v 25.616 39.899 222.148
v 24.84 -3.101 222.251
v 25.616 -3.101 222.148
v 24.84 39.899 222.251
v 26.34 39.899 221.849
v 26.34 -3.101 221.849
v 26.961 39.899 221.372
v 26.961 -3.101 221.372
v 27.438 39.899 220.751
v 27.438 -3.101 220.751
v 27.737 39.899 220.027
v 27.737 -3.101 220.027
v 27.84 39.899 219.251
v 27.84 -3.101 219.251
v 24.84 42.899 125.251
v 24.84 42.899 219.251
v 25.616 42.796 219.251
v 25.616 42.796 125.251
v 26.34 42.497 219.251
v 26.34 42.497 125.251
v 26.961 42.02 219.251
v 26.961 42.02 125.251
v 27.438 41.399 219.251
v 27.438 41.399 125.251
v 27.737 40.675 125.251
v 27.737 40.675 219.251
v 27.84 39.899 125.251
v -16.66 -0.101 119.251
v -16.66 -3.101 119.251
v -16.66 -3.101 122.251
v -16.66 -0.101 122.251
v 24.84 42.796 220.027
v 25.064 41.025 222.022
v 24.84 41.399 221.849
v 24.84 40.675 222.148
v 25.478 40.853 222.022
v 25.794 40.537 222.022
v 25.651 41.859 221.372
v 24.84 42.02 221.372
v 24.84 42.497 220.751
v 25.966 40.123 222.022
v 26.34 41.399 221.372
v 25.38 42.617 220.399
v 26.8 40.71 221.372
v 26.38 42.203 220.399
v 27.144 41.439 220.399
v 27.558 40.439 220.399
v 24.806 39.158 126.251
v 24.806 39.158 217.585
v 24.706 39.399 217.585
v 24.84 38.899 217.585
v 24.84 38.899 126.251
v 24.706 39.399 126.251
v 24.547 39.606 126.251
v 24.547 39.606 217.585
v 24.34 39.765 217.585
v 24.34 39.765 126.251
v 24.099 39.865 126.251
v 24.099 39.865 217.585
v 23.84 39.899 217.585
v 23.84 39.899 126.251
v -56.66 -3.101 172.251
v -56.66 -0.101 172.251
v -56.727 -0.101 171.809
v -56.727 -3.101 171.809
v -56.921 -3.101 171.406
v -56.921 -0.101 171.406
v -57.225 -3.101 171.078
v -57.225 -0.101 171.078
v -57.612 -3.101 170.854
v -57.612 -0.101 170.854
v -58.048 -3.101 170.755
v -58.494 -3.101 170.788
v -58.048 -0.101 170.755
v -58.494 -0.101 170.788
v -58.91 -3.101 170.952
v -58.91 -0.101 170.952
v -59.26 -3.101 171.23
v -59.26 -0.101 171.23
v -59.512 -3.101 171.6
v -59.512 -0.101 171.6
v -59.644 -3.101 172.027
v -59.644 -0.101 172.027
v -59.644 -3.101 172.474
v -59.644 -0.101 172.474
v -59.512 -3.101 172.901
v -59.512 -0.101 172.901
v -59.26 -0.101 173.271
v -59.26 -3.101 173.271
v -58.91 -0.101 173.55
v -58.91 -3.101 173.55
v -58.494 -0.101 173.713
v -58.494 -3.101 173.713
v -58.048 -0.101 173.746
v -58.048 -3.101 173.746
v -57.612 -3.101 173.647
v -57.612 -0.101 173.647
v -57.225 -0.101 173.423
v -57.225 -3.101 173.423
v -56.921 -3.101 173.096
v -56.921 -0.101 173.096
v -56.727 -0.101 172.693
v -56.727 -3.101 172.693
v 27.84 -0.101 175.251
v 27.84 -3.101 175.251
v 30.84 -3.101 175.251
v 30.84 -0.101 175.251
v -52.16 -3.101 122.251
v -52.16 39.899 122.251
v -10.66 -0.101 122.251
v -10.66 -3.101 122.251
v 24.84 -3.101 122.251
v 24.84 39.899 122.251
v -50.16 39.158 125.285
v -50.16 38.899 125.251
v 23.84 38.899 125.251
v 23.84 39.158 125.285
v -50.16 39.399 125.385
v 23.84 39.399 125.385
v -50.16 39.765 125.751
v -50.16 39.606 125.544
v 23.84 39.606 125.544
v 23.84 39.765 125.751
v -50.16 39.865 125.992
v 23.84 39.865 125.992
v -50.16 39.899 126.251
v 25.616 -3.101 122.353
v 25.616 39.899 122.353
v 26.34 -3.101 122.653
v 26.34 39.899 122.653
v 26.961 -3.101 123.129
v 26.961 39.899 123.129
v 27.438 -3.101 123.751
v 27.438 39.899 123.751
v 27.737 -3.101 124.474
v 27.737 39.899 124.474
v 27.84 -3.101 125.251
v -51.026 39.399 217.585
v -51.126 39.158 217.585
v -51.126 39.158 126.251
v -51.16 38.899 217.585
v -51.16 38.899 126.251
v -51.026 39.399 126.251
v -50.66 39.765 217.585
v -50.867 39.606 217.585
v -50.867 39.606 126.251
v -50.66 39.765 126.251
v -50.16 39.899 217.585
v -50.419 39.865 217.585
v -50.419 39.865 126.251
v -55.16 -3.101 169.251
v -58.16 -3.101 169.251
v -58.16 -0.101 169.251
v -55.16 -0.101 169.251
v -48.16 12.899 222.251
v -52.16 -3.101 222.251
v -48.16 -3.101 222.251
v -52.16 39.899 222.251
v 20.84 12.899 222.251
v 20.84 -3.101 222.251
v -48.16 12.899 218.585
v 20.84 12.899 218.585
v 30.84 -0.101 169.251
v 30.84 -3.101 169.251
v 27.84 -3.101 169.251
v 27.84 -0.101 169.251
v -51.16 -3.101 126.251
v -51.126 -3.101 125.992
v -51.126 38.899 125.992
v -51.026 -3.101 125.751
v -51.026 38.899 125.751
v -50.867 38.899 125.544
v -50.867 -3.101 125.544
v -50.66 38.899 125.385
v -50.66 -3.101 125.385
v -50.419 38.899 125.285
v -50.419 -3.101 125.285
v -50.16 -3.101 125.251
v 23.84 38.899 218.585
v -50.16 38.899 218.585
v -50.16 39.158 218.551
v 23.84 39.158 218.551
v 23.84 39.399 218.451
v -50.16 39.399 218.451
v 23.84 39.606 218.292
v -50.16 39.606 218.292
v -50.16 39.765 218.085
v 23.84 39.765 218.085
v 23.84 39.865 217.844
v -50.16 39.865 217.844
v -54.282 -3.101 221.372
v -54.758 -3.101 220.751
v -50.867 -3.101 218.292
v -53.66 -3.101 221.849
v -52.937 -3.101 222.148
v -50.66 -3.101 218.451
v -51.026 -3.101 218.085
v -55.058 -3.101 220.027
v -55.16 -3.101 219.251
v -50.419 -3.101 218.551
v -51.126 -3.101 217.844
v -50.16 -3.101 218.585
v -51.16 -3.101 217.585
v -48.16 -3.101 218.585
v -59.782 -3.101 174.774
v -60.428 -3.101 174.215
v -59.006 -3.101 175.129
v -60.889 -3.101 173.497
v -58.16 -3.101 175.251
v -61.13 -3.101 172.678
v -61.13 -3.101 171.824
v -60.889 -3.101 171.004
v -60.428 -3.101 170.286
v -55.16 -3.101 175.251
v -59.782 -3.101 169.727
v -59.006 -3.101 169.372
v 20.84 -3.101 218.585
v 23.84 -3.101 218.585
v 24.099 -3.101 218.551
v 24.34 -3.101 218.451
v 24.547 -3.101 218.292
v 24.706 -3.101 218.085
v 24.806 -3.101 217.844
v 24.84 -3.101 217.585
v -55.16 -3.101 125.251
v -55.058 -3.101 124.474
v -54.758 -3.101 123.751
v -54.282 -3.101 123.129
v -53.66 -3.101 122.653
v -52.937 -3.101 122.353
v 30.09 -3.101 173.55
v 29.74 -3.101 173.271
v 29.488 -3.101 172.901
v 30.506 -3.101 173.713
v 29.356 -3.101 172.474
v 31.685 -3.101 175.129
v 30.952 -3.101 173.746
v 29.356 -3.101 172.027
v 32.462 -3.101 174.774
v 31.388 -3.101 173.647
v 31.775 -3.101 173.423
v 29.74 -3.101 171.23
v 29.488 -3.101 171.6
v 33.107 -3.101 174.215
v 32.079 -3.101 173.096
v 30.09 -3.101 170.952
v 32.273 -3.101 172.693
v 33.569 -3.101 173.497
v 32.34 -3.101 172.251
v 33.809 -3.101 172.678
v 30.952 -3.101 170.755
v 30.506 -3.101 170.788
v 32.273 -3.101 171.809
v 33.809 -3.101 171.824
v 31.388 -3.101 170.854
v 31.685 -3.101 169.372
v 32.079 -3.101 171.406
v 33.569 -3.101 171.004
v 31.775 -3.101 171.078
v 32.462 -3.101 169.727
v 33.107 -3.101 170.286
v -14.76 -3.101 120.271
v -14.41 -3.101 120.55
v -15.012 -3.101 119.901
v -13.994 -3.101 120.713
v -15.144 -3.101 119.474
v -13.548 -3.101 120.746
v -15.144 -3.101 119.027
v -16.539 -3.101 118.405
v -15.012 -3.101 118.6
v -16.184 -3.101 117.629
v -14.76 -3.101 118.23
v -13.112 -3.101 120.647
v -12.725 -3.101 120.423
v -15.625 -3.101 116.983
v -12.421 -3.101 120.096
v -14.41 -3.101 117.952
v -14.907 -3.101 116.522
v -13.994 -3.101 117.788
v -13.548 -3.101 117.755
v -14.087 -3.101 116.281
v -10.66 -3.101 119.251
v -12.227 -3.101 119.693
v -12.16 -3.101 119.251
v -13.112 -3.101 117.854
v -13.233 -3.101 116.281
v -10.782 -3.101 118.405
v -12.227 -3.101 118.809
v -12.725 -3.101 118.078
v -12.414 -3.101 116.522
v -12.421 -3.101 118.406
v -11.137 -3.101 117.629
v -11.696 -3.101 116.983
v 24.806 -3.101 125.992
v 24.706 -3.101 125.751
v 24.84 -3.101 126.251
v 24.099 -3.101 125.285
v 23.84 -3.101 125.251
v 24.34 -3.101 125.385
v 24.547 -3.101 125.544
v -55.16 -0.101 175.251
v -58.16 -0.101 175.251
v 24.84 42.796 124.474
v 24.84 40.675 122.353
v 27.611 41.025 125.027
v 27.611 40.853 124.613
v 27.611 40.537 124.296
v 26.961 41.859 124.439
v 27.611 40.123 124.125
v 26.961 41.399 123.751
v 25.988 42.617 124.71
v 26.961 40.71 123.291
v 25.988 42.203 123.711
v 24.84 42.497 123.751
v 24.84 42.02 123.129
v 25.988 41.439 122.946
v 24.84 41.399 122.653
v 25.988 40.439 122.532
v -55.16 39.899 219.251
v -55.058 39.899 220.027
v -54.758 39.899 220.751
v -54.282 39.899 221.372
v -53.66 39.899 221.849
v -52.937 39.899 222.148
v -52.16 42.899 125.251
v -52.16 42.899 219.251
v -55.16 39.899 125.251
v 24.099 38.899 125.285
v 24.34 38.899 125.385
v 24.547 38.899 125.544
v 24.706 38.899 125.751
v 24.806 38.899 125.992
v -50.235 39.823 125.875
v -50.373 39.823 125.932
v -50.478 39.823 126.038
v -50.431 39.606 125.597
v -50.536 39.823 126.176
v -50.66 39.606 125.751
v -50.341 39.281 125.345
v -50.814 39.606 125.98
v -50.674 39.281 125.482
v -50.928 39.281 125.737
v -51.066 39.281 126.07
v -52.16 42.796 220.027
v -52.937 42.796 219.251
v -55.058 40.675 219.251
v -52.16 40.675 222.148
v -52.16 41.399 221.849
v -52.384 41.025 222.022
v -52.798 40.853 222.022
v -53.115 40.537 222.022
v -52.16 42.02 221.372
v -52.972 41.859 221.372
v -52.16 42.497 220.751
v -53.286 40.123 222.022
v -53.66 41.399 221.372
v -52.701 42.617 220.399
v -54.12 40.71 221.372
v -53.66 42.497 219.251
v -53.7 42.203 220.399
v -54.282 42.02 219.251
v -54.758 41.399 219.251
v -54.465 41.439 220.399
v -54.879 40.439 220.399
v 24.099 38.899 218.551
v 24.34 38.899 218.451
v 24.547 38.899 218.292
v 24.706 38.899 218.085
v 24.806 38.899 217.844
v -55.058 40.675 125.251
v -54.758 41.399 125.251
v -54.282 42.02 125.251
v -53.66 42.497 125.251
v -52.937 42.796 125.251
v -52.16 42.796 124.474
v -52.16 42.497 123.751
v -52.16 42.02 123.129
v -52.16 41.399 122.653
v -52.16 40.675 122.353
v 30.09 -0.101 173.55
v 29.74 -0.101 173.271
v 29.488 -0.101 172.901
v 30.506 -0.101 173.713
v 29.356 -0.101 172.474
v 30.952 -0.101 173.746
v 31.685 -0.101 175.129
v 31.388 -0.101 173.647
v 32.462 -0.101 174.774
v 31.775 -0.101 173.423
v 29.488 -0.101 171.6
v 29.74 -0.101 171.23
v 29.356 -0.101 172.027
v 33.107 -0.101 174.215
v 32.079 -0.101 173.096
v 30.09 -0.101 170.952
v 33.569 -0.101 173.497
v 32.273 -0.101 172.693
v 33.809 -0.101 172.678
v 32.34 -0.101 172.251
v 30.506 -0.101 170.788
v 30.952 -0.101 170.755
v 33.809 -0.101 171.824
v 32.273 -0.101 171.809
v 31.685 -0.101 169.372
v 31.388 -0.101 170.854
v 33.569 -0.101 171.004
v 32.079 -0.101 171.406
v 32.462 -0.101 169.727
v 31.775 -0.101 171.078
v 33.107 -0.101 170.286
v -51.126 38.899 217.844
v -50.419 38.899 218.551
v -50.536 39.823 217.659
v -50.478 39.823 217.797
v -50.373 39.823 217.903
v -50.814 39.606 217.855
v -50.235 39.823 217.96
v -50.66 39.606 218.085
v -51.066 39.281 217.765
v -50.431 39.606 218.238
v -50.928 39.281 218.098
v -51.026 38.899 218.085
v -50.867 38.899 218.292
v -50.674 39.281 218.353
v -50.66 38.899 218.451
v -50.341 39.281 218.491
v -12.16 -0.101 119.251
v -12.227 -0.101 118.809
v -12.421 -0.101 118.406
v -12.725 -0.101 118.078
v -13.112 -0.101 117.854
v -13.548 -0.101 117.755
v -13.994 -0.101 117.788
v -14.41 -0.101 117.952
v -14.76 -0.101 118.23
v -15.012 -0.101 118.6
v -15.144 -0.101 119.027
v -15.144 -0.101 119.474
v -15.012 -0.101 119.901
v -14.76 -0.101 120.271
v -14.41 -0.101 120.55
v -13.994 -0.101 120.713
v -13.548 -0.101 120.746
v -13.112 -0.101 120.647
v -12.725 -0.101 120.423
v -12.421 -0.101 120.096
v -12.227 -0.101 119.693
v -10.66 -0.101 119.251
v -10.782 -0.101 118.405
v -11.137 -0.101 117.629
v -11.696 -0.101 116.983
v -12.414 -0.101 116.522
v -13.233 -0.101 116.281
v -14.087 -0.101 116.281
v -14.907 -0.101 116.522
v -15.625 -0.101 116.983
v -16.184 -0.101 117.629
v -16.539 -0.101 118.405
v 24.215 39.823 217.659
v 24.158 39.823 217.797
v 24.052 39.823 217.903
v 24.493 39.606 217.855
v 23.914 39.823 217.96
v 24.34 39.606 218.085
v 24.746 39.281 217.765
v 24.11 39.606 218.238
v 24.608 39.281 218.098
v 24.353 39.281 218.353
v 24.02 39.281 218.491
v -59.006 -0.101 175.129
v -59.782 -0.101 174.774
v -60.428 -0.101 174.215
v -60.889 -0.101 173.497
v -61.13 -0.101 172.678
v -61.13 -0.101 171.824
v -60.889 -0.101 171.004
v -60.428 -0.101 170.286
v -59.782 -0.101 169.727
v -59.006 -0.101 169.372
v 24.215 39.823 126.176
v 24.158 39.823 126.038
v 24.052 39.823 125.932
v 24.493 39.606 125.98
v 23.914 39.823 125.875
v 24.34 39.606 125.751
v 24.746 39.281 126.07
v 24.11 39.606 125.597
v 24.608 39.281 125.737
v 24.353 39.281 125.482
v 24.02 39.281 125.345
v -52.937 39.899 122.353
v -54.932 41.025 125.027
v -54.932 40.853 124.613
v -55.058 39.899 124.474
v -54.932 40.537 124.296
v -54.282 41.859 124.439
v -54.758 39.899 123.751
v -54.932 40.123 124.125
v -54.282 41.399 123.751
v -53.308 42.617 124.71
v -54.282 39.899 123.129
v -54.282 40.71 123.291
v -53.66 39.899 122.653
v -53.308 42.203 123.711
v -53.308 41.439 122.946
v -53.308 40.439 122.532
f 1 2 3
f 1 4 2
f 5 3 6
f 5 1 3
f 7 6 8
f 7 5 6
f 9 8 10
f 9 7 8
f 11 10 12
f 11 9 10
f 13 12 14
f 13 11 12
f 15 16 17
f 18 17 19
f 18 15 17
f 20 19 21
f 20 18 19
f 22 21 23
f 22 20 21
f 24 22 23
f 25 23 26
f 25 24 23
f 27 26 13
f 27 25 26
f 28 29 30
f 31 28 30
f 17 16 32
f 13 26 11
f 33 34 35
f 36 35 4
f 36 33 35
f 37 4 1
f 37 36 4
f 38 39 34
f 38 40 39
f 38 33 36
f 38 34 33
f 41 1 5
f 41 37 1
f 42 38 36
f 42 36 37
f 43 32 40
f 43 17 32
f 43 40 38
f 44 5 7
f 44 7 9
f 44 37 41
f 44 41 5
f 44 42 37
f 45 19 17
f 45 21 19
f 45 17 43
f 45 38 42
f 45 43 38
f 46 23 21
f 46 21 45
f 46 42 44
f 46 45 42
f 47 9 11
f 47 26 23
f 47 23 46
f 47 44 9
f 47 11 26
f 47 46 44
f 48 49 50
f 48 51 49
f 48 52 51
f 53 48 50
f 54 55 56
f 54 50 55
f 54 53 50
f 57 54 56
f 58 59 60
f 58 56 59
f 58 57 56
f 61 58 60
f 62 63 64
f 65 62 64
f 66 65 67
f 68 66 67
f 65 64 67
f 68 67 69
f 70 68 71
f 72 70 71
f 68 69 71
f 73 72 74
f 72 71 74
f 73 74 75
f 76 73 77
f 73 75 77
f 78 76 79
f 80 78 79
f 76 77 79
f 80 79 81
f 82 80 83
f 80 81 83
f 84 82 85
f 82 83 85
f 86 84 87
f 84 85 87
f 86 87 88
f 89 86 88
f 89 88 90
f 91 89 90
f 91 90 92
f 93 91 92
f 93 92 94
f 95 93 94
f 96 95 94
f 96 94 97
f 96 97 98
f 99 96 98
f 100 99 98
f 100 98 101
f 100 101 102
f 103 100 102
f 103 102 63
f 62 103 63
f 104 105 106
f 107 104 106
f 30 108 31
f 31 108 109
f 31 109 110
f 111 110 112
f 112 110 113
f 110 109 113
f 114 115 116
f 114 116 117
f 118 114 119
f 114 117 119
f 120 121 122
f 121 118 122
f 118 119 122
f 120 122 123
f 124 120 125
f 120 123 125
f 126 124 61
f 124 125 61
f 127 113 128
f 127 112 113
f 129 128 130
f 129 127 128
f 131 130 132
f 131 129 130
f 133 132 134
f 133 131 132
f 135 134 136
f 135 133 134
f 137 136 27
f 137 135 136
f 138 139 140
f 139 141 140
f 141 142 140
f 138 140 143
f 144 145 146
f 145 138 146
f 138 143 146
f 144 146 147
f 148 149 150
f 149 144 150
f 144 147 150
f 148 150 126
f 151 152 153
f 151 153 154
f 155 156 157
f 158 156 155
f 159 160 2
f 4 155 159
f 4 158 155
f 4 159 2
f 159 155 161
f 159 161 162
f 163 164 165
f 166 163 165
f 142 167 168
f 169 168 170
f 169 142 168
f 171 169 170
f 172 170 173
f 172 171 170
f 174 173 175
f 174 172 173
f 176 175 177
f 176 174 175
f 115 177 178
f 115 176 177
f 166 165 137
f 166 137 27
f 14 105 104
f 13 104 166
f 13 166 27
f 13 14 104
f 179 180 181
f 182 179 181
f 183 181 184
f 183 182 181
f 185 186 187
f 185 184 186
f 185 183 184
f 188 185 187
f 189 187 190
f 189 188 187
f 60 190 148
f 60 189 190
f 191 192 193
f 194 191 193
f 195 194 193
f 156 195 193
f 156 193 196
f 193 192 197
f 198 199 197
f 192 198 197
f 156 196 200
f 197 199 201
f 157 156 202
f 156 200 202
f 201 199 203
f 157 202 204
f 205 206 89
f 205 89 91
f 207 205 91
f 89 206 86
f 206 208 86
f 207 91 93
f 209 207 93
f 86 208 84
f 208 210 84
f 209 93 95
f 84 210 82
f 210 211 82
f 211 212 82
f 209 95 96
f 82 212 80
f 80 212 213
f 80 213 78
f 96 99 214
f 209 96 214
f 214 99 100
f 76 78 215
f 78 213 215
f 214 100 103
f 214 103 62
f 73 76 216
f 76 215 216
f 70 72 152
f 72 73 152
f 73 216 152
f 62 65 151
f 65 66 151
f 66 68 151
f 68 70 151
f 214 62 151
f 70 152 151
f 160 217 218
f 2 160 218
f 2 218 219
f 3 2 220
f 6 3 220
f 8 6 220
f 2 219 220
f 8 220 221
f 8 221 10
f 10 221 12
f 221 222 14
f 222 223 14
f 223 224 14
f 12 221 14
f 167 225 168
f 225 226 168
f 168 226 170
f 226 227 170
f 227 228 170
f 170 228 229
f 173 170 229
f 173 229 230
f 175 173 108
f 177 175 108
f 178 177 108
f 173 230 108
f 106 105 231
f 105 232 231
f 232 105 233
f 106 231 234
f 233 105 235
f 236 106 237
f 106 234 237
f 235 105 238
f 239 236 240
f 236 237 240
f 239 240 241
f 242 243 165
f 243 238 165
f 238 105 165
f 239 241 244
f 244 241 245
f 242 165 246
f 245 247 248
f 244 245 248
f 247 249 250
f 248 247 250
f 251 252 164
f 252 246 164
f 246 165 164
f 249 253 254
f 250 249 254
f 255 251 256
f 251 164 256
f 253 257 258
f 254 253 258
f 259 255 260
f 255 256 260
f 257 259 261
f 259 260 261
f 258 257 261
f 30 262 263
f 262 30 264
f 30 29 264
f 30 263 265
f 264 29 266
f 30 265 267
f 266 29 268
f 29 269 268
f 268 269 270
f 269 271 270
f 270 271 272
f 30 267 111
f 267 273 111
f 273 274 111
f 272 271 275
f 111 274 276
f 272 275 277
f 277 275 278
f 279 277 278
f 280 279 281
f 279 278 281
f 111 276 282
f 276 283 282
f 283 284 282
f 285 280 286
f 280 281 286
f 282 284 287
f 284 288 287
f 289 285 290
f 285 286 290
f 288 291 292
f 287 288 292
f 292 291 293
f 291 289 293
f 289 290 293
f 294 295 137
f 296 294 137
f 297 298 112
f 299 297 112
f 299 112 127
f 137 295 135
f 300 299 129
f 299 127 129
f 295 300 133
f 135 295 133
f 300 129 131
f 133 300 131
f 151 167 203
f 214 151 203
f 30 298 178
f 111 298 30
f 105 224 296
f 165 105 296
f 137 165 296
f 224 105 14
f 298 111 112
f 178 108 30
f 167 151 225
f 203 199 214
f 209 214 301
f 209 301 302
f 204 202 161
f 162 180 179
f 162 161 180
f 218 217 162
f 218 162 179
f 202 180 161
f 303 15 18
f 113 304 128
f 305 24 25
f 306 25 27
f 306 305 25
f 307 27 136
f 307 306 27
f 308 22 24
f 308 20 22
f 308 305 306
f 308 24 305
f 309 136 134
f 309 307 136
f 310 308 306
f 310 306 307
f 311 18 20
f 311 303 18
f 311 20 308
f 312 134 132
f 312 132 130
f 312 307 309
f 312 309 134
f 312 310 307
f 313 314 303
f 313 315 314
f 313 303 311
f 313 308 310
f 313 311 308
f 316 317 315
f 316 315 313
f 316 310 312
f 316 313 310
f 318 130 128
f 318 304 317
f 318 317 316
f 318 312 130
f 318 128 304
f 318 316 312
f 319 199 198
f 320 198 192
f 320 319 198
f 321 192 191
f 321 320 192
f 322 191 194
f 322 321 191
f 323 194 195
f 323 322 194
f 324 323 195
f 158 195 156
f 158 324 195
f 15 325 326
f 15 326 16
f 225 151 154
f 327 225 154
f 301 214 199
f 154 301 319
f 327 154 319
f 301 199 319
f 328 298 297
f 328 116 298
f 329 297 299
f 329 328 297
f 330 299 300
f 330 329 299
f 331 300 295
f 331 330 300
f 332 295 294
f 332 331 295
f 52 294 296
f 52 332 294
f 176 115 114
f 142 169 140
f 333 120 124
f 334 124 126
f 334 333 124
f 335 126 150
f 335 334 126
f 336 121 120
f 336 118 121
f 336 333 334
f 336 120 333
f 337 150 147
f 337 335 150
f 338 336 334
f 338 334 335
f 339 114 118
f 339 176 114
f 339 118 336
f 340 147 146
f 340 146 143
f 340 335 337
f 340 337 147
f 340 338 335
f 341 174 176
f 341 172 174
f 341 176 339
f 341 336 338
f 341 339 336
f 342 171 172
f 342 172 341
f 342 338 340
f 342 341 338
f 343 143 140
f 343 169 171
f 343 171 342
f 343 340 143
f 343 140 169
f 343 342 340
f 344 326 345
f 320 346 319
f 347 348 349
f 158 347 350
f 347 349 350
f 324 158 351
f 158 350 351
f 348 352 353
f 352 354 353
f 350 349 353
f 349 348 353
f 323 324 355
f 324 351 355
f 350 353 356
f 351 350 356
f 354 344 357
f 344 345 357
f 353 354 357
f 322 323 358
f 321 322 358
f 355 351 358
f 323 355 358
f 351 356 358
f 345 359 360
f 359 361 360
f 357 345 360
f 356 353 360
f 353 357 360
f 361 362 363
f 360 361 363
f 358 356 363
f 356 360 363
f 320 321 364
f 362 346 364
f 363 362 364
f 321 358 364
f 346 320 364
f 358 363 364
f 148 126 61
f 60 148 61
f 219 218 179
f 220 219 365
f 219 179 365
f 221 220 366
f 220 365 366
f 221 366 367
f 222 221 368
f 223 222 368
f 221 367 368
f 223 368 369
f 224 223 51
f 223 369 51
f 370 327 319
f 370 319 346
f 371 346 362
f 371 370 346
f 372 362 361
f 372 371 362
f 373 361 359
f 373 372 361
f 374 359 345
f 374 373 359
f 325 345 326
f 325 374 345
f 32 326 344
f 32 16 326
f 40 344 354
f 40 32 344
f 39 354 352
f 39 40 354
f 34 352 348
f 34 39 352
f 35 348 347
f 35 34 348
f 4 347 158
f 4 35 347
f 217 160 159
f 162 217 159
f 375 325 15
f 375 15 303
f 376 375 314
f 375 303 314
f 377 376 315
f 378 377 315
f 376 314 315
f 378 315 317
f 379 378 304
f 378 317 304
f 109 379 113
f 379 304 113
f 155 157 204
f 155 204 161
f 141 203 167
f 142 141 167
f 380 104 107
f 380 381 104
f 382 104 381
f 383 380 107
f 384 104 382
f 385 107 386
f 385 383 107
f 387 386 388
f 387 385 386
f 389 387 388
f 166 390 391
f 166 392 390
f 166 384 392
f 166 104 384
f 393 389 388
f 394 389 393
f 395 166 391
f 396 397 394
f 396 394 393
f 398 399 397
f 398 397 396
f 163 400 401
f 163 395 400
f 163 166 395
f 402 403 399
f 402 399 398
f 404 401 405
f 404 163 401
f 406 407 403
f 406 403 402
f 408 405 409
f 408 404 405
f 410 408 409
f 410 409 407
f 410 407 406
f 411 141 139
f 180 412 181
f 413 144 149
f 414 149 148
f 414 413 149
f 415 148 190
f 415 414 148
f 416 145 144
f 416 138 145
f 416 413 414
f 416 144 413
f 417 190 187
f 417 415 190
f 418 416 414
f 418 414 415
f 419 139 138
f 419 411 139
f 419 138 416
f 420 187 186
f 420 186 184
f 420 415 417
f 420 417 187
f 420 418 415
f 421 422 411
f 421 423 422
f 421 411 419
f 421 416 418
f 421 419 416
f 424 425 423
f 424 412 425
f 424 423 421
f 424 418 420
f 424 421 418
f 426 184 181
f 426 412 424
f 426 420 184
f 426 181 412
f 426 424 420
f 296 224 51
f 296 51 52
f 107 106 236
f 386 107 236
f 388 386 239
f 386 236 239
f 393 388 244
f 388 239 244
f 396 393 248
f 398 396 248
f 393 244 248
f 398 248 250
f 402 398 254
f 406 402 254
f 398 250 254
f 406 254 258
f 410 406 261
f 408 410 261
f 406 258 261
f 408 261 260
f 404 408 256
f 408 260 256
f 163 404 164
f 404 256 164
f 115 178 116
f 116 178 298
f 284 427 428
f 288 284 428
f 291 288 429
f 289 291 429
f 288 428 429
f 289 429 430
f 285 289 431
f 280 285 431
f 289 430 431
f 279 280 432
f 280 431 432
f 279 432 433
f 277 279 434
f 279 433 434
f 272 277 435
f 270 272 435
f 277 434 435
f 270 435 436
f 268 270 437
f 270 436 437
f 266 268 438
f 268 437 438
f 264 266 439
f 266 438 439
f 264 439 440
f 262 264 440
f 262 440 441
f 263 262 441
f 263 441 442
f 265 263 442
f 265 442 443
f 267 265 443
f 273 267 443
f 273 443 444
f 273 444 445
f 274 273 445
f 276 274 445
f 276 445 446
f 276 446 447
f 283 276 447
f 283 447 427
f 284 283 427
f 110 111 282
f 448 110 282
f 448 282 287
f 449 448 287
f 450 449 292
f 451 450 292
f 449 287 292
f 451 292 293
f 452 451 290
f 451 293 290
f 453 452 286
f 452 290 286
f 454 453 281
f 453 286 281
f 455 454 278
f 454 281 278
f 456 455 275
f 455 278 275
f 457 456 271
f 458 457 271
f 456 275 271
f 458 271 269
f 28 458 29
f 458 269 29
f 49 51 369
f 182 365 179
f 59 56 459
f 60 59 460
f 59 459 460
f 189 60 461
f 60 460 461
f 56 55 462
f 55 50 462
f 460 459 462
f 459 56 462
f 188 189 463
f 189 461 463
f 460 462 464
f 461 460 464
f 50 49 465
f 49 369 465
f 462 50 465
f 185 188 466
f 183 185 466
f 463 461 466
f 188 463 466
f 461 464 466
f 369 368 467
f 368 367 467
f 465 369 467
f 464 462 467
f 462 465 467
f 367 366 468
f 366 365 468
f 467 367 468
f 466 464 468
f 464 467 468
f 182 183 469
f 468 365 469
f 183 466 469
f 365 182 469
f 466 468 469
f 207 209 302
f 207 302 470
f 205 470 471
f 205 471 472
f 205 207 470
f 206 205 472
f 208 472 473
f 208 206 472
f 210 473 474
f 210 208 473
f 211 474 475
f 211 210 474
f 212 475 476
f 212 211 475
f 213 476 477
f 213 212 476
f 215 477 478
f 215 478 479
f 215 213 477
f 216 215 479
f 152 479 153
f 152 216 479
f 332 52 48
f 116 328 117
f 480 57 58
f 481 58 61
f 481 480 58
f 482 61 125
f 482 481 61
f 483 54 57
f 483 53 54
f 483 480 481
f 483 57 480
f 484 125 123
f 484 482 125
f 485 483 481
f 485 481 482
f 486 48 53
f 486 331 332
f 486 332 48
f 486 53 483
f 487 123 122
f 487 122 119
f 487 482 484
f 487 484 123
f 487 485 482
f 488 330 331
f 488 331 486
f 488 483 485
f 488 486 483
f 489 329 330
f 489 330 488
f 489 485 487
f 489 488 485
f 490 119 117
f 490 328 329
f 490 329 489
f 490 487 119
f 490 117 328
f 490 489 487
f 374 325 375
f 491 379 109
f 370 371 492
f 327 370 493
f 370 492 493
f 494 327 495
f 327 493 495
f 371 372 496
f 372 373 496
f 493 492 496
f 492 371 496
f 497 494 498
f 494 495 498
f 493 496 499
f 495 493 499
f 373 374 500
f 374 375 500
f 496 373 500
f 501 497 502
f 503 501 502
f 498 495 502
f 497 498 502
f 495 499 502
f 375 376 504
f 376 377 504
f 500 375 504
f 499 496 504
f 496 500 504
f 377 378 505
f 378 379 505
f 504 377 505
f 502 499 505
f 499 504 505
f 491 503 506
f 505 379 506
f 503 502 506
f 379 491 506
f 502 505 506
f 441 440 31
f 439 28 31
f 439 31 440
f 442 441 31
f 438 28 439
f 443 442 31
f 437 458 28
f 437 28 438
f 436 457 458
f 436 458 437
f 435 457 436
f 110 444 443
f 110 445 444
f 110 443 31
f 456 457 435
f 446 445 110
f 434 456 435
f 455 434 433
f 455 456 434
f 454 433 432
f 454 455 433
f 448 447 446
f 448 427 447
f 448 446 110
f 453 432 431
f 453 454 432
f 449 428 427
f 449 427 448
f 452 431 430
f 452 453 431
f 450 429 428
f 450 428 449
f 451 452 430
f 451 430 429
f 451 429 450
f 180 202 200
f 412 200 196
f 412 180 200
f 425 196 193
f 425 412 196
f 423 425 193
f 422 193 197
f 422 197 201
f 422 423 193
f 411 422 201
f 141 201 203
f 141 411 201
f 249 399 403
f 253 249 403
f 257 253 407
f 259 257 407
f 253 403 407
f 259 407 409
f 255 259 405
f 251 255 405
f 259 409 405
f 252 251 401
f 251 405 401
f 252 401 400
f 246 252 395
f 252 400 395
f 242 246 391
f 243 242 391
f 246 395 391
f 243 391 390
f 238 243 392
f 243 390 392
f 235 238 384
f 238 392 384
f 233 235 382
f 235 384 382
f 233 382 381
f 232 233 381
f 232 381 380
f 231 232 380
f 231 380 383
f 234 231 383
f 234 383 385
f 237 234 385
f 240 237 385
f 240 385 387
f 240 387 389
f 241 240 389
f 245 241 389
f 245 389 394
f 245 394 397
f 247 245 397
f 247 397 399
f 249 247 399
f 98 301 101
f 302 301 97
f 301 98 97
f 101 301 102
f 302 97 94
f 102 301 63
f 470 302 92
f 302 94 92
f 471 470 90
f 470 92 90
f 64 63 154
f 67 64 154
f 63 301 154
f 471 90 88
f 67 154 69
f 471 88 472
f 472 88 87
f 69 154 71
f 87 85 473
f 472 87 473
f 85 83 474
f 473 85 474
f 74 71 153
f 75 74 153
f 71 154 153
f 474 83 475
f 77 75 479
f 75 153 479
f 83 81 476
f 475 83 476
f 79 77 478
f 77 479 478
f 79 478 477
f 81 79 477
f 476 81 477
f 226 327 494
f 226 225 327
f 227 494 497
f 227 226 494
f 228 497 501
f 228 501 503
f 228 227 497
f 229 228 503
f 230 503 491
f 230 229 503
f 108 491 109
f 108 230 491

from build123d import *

# Parameters (mm, degrees)
CROQUIS2_W              = 83
CROQUIS2_H              = 100
CROQUIS2_W_2            = 76
CROQUIS2_H_2            = 93.334161502
SALIENTE_EXTRUIR1_DEPTH = 43
CROQUIS3_W              = 83
CROQUIS3_H              = 3
SALIENTE_EXTRUIR2_DEPTH = 100
CROQUIS4_W              = 69
CROQUIS4_H              = 16
CORTAR_EXTRUIR3_DEPTH   = 10
SALIENTE_EXTRUIR3_DEPTH = 3
CROQUIS6_R              = 1.5
CORTAR_EXTRUIR4_DEPTH   = 13
REDONDEO1_R             = 3
REDONDEO2_R             = 1


with BuildPart() as part:
    # Croquis2 → Saliente-Extruir1 (new body)
    with BuildSketch(Plane(origin=(0, -3.101295798, 0), x_dir=(1, 0, 0), z_dir=(0, 1, 0))):
        with Locations((-13.660303869, -172.250641144)):
            Rectangle(CROQUIS2_W, CROQUIS2_H)
        with Locations((-13.160303869, -171.917721895)):
            Rectangle(CROQUIS2_W_2, CROQUIS2_H_2, mode=Mode.SUBTRACT)
    extrude(amount=SALIENTE_EXTRUIR1_DEPTH)

    # Croquis3 → Saliente-Extruir2 (add)
    with BuildSketch(Plane.XY.offset(222.250641144)):
        with Locations((-13.660303869, 41.398704202)):
            Rectangle(CROQUIS3_W, CROQUIS3_H)
    extrude(amount=-SALIENTE_EXTRUIR2_DEPTH)

    # Croquis4 → Cortar-Extruir3 (cut)
    with BuildSketch(Plane.XY.offset(222.250641144)):
        with Locations((-13.660303869, 4.898704202)):
            Rectangle(CROQUIS4_W, CROQUIS4_H)
    extrude(amount=-CORTAR_EXTRUIR3_DEPTH, mode=Mode.SUBTRACT)

    # Croquis5 → Saliente-Extruir3 (add)
    with BuildSketch(Plane(origin=(0, -3.101295798, 0), x_dir=(1, 0, 0), z_dir=(0, 1, 0))):
        with BuildLine():
            Line((-58.160303869, -169.250641144), (-55.160303869, -169.250641144))
            Line((-55.160303869, -169.250641144), (-55.160303869, -175.250641144))
            Line((-55.160303869, -175.250641144), (-58.160303869, -175.250641144))
            ThreePointArc((-58.160303869, -175.250641144), (-61.160303869, -172.250641144), (-58.160303869, -169.250641144))
        make_face()
        with BuildLine():
            Line((-16.660303869, -119.250641144), (-16.660303869, -122.250641144))
            Line((-16.660303869, -122.250641144), (-10.660303869, -122.250641144))
            Line((-10.660303869, -122.250641144), (-10.660303869, -119.250641144))
            ThreePointArc((-10.660303869, -119.250641144), (-13.660303869, -116.250641144), (-16.660303869, -119.250641144))
        make_face()
        with BuildLine():
            Line((30.839696131, -169.250641144), (27.839696131, -169.250641144))
            Line((27.839696131, -169.250641144), (27.839696131, -175.250641144))
            Line((27.839696131, -175.250641144), (30.839696131, -175.250641144))
            ThreePointArc((30.839696131, -175.250641144), (33.839696131, -172.250641144), (30.839696131, -169.250641144))
        make_face()
    extrude(amount=SALIENTE_EXTRUIR3_DEPTH)

    # Croquis6 → Cortar-Extruir4 (cut)
    with BuildSketch(Plane(origin=(0, -0.101295798, 0), x_dir=(1, 0, 0), z_dir=(0, 1, 0))):
        with Locations((30.839696131, -172.250641144)):
            Circle(CROQUIS6_R)
        with Locations((-13.660303869, -119.250641144)):
            Circle(CROQUIS6_R)
        with Locations((-58.160303869, -172.250641144)):
            Circle(CROQUIS6_R)
    extrude(amount=-CORTAR_EXTRUIR4_DEPTH, mode=Mode.SUBTRACT)

    # Redondeo1
    redondeo1_edges = [part.edges().sort_by_distance(p)[0] for p in [
        (-13.660303869, 42.898704202, 122.250641144),
        (-55.160303869, 42.898704202, 172.250641144),
        (27.839696131, 42.898704202, 172.250641144),
        (-13.660303869, 42.898704202, 222.250641144),
        (-55.160303869, 19.898704202, 122.250641144),
        (27.839696131, 19.898704202, 122.250641144),
        (27.839696131, 19.898704202, 222.250641144),
        (-55.160303869, 19.898704202, 222.250641144),
    ]]
    fillet(redondeo1_edges, radius=REDONDEO1_R)

    # Redondeo2
    redondeo2_edges = [part.edges().sort_by_distance(p)[0] for p in [
        (24.839696131, 18.398704202, 218.584802646),
        (24.839696131, 18.398704202, 125.250641144),
        (-51.160303869, 18.398704202, 125.250641144),
        (-51.160303869, 18.398704202, 218.584802646),
        (24.839696131, 39.898704202, 171.917721895),
        (-13.160303869, 39.898704202, 125.250641144),
        (-51.160303869, 39.898704202, 171.917721895),
        (-13.160303869, 39.898704202, 218.584802646),
    ]]
    fillet(redondeo2_edges, radius=REDONDEO2_R)


solid = part.part
